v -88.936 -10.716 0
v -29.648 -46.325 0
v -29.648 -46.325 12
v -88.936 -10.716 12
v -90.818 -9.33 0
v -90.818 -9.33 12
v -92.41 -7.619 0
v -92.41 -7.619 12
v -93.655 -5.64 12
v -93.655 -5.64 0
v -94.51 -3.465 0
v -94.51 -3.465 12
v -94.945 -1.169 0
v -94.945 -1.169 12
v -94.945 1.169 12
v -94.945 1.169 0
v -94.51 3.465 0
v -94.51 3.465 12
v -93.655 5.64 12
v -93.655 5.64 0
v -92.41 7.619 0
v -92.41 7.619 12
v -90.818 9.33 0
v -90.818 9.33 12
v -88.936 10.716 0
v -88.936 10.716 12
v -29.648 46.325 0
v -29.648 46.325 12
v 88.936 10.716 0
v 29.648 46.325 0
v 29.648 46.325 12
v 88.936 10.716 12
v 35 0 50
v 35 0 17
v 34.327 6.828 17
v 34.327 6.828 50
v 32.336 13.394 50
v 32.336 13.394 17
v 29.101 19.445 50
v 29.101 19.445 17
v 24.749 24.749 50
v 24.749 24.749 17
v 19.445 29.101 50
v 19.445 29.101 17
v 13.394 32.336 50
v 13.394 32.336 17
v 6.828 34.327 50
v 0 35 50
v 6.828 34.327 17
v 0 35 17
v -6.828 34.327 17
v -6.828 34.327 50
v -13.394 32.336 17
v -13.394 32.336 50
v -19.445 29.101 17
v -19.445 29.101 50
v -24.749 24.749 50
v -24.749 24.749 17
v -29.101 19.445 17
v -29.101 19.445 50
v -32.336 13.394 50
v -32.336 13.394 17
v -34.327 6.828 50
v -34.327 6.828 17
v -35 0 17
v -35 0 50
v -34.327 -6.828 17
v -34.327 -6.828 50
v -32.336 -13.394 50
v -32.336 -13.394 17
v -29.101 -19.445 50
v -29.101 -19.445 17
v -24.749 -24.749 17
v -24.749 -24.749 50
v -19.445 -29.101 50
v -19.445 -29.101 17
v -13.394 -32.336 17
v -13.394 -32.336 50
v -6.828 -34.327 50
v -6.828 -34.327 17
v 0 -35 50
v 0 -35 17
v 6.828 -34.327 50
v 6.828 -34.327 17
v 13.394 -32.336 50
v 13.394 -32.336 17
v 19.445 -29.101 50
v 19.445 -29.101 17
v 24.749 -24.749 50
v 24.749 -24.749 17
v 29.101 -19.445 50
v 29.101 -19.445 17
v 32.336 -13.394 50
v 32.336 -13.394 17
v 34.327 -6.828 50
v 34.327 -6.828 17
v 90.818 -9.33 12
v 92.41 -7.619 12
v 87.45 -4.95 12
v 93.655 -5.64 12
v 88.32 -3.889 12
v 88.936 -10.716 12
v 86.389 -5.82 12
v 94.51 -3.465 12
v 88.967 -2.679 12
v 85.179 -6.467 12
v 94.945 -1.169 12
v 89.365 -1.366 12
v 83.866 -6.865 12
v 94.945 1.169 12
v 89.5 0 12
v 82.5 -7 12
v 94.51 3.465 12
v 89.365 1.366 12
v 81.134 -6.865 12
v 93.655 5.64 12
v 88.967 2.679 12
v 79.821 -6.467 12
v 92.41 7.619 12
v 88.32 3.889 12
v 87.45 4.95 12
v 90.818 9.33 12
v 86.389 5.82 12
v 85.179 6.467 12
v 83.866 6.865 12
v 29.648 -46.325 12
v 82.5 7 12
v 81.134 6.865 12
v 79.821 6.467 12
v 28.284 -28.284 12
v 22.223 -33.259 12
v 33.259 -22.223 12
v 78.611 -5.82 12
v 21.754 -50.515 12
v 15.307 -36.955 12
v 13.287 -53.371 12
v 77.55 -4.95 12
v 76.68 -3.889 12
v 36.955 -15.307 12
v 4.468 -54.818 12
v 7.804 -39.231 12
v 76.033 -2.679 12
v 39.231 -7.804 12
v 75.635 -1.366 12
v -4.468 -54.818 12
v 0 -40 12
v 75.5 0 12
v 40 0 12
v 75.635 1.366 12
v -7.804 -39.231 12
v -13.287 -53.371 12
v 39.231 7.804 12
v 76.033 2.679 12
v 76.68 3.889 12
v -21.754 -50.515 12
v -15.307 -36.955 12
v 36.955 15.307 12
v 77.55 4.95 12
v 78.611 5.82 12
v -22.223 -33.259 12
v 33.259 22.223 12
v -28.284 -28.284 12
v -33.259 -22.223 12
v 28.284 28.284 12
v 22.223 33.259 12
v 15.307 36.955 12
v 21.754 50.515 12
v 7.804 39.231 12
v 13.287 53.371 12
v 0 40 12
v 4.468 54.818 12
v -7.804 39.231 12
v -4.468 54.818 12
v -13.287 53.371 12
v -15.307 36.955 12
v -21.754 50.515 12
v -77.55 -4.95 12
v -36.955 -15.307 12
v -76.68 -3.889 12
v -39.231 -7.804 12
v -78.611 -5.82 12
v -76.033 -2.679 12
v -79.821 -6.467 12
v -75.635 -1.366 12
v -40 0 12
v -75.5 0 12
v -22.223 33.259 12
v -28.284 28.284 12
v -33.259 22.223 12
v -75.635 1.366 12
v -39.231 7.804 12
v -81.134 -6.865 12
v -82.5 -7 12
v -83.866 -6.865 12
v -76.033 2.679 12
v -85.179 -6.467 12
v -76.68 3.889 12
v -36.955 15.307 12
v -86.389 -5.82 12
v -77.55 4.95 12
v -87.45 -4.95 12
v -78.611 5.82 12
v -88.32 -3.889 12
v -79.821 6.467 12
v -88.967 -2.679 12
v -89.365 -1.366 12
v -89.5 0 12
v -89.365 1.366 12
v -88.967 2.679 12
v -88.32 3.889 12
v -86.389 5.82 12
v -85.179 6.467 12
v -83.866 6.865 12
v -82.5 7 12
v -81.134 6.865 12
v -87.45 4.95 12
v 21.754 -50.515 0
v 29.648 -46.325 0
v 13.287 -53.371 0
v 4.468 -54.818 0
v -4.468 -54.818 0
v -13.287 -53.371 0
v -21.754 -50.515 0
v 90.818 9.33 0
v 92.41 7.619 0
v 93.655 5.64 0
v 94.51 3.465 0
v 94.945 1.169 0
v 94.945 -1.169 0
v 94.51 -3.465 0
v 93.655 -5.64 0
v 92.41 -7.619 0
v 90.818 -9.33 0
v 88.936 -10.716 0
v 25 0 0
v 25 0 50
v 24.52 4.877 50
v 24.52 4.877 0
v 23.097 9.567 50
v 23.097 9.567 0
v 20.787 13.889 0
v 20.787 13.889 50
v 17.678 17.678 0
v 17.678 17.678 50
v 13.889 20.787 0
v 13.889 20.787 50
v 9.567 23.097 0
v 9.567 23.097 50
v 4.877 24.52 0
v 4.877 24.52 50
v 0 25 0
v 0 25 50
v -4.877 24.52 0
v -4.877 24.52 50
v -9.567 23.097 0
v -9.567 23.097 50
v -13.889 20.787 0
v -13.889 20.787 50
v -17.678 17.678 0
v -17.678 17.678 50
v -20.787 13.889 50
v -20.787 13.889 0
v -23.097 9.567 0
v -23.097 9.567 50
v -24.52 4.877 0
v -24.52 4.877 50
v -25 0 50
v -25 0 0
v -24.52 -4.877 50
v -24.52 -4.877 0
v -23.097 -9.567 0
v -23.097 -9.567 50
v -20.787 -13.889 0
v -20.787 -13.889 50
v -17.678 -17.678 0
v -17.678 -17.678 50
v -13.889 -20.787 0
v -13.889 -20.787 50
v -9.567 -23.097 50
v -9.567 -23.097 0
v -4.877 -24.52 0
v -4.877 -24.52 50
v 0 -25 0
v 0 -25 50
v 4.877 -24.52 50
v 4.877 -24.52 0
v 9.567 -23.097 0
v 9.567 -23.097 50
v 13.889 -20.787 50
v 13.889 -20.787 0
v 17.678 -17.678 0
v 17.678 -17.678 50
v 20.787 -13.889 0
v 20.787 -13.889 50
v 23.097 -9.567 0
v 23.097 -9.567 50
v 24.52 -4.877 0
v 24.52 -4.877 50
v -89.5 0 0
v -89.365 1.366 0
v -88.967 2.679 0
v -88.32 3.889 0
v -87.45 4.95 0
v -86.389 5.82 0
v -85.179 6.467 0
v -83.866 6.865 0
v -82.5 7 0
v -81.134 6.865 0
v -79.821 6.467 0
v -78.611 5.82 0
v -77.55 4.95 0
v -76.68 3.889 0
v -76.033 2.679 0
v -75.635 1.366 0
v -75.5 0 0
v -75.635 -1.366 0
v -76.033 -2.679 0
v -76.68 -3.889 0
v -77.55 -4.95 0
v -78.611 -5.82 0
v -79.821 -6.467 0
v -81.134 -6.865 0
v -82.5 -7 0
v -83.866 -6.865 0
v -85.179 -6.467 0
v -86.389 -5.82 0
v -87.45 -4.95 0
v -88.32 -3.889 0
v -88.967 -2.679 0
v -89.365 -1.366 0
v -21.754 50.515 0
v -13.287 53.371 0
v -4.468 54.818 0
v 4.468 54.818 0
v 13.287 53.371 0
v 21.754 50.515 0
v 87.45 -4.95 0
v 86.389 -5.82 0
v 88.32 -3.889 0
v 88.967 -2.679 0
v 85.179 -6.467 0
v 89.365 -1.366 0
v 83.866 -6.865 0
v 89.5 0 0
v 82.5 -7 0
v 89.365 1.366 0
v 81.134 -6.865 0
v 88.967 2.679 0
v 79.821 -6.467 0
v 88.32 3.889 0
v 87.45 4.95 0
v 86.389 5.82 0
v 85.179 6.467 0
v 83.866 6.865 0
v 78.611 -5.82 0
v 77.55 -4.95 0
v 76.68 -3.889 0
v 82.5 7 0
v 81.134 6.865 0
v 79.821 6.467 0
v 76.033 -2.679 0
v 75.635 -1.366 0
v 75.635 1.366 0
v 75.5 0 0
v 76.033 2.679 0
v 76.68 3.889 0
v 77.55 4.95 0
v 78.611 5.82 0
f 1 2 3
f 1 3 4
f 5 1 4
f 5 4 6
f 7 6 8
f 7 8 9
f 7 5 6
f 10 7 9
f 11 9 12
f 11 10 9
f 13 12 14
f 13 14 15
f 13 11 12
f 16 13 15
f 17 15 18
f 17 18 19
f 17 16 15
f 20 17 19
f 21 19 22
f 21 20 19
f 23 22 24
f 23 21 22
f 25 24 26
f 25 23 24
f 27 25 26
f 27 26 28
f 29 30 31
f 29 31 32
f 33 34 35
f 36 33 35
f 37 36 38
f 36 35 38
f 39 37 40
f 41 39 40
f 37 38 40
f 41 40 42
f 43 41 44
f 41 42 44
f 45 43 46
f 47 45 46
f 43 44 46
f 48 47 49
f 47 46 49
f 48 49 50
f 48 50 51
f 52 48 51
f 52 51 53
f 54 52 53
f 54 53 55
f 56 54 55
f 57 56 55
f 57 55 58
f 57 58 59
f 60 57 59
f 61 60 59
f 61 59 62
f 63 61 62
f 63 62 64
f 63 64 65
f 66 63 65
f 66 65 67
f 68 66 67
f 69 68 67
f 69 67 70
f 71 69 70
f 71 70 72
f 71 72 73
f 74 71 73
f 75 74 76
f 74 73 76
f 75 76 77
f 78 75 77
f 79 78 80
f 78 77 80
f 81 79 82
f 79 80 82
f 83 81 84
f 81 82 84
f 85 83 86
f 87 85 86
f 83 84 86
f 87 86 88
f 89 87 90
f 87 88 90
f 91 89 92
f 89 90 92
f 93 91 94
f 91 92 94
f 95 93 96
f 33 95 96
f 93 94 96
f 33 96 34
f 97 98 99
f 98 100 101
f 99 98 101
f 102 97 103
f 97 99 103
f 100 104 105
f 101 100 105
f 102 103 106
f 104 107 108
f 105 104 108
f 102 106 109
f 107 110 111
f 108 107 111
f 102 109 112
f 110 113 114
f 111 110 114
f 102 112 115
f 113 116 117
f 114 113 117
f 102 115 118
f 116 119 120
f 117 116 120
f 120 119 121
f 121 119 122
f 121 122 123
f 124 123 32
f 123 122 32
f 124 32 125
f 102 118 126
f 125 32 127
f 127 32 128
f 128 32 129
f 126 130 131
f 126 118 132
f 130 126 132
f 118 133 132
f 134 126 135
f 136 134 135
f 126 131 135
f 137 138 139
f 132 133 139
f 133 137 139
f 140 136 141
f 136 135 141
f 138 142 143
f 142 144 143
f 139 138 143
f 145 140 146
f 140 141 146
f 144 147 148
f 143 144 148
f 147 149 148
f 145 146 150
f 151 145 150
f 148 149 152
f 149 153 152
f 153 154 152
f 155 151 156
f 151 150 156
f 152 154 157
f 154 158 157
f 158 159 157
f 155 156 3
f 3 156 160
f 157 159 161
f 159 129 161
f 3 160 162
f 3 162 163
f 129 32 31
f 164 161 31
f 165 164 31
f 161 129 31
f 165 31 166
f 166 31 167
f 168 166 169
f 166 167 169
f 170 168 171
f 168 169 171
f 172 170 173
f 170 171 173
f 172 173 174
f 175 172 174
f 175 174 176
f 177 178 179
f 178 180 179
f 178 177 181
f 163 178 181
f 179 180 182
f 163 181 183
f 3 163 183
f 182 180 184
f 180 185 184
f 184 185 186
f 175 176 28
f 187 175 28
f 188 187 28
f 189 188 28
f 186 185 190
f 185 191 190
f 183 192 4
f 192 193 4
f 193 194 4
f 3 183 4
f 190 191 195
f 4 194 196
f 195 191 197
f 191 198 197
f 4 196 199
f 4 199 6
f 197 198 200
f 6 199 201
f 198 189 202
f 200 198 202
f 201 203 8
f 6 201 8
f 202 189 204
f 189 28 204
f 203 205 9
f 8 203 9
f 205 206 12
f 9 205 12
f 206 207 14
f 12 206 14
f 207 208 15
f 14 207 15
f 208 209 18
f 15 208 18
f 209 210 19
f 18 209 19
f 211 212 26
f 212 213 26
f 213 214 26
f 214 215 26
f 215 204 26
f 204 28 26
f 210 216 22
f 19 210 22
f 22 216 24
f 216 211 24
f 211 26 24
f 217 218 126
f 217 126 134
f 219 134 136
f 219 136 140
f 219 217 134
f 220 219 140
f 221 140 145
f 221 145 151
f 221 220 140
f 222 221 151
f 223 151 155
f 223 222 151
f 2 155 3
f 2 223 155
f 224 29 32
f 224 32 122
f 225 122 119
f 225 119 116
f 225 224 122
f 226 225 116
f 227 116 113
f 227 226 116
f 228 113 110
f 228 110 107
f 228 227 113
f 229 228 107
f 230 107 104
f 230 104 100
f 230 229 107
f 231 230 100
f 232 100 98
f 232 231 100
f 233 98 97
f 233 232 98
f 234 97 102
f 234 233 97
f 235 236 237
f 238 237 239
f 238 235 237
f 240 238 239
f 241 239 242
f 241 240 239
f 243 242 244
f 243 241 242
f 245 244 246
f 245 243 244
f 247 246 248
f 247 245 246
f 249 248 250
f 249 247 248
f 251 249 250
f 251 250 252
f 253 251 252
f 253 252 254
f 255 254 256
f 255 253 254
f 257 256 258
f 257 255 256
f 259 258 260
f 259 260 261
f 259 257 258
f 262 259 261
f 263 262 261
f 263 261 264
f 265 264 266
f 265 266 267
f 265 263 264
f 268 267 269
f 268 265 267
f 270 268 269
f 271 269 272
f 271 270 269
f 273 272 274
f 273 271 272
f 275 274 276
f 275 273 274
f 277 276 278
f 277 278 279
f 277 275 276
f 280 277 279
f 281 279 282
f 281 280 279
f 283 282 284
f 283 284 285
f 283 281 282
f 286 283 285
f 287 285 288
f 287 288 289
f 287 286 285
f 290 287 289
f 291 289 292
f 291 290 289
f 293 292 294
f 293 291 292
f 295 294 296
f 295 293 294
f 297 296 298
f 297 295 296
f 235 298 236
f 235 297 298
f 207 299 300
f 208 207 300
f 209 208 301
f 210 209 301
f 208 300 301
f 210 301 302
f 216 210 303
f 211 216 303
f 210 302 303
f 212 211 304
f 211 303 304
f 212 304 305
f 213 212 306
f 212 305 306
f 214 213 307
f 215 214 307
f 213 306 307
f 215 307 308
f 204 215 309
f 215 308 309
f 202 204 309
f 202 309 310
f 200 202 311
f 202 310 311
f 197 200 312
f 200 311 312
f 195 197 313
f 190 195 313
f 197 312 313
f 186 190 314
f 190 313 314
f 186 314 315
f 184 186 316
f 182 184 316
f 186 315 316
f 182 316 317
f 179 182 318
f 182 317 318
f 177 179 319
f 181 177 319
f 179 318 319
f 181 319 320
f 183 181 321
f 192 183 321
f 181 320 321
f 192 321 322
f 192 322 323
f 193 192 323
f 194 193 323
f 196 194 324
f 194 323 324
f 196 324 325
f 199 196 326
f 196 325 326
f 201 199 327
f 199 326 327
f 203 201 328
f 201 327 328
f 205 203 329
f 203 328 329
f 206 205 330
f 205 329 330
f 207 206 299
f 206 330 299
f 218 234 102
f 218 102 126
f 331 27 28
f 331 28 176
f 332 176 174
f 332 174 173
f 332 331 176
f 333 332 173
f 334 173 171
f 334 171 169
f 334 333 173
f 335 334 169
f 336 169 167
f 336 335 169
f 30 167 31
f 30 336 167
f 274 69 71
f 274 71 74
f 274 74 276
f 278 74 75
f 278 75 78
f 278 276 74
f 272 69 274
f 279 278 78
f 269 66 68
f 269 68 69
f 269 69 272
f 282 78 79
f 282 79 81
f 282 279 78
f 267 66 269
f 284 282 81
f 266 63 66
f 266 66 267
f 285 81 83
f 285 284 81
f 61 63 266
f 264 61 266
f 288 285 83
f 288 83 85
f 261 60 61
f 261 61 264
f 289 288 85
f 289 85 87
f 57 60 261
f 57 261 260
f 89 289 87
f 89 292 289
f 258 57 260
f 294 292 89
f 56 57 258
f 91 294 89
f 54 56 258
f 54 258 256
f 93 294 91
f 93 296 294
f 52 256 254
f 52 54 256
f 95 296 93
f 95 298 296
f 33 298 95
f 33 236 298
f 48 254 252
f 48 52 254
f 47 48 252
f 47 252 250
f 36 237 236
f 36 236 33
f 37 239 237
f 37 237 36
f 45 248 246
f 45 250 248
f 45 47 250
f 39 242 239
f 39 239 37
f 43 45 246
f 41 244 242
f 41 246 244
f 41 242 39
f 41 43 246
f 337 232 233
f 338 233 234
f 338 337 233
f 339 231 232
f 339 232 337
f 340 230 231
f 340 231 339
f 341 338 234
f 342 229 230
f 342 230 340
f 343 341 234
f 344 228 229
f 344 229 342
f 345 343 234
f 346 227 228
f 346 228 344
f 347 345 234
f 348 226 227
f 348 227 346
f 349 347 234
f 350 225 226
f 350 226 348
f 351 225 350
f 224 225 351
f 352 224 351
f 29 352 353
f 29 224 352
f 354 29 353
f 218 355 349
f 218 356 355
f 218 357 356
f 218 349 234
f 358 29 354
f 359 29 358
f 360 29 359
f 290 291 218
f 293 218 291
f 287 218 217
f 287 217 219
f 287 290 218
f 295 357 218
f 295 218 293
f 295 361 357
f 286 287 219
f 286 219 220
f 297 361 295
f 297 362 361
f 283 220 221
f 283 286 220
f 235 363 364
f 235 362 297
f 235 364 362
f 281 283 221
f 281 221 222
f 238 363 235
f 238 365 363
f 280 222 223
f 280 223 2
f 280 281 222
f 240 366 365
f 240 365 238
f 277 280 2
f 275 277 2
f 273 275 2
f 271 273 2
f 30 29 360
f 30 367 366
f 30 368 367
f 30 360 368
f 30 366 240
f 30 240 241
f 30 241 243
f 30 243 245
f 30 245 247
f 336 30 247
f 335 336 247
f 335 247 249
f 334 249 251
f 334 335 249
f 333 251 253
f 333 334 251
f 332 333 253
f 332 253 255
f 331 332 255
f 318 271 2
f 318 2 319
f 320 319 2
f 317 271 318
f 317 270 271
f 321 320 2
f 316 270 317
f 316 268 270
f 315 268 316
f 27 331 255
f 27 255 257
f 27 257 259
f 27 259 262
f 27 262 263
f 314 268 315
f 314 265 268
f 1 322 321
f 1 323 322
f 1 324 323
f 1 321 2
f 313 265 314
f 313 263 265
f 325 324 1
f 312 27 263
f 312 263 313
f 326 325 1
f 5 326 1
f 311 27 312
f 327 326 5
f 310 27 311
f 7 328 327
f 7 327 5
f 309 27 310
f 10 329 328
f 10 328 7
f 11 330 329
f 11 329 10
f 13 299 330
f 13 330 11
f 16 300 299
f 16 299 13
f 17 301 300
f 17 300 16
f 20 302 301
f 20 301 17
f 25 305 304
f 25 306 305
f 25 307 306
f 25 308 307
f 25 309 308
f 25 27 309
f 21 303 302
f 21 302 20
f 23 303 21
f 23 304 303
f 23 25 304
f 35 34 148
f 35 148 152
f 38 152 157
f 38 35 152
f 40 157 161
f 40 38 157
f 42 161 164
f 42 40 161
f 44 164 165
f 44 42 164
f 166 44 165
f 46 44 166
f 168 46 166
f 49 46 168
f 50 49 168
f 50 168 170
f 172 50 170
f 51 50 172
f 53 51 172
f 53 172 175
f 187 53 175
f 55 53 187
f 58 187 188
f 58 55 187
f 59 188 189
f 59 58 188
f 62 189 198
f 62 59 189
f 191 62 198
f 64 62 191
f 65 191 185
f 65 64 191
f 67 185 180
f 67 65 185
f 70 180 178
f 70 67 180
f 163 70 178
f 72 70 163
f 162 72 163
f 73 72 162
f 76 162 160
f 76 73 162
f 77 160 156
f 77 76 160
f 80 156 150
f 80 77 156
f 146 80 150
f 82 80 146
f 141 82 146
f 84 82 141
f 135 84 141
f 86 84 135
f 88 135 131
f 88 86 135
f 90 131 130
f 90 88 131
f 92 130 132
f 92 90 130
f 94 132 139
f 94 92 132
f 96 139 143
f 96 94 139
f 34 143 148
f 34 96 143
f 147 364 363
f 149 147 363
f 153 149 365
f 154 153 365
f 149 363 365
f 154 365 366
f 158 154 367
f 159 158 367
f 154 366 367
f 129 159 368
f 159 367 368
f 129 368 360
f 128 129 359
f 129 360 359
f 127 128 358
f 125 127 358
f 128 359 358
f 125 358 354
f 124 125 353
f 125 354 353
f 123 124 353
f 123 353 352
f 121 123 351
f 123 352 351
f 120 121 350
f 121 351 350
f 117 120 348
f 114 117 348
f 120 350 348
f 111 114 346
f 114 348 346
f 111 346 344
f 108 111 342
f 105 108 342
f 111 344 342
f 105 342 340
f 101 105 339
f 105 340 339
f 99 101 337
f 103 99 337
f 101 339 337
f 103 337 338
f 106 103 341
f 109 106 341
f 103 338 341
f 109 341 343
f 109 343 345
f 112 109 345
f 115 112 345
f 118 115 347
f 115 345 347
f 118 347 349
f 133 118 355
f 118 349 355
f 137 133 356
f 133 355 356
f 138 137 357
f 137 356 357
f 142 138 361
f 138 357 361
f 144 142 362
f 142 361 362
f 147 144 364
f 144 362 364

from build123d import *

# Parameters (mm, degrees)
SKETCH1_R           = 35
SKETCH1_R_2         = 25
BOSS_EXTRUDE1_DEPTH = 50
SKETCH2_R           = 35
BOSS_EXTRUDE2_DEPTH = 12
SKETCH3_R           = 7
CUT_EXTRUDE1_DEPTH  = 12
CHAMFER1_SIZE       = 5


with BuildPart() as part:
    # Sketch1 → Boss-Extrude1 (new body)
    with BuildSketch(Plane.XY):
        Circle(SKETCH1_R)
        Circle(SKETCH1_R_2, mode=Mode.SUBTRACT)
    extrude(amount=BOSS_EXTRUDE1_DEPTH)

    # Sketch2 → Boss-Extrude2 (add)
    with BuildSketch(Plane.XY):
        with BuildLine():
            Line((-29.647715243, -46.325079394), (-88.936024476, -10.715763573))
            ThreePointArc((-88.936024476, -10.715763573), (-95, 0), (-88.936024476, 10.715763573))
            Line((-88.936024476, 10.715763573), (-29.647715243, 46.325079394))
            ThreePointArc((-29.647715243, 46.325079394), (0, 55), (29.647715243, 46.325079394))
            Line((29.647715243, 46.325079394), (88.936024476, 10.715763573))
            ThreePointArc((88.936024476, 10.715763573), (95, 0), (88.936024476, -10.715763573))
            Line((88.936024476, -10.715763573), (29.647715243, -46.325079394))
            ThreePointArc((29.647715243, -46.325079394), (0, -55), (-29.647715243, -46.325079394))
        make_face()
        Circle(SKETCH2_R, mode=Mode.SUBTRACT)
    extrude(amount=BOSS_EXTRUDE2_DEPTH)

    # Sketch3 → Cut-Extrude1 (cut)
    with BuildSketch(Plane(origin=(0, 0, 0), x_dir=(-1, 0, 0), z_dir=(0, 0, -1))):
        with Locations((-82.5, 0)):
            Circle(SKETCH3_R)
        with Locations((82.5, 0)):
            Circle(SKETCH3_R)
    extrude(amount=-CUT_EXTRUDE1_DEPTH, mode=Mode.SUBTRACT)

    # Chamfer1
    chamfer1_edges = [part.edges().sort_by_distance(p)[0] for p in [
        (-35, 0, 12),
    ]]
    chamfer(chamfer1_edges, length=CHAMFER1_SIZE)


solid = part.part
